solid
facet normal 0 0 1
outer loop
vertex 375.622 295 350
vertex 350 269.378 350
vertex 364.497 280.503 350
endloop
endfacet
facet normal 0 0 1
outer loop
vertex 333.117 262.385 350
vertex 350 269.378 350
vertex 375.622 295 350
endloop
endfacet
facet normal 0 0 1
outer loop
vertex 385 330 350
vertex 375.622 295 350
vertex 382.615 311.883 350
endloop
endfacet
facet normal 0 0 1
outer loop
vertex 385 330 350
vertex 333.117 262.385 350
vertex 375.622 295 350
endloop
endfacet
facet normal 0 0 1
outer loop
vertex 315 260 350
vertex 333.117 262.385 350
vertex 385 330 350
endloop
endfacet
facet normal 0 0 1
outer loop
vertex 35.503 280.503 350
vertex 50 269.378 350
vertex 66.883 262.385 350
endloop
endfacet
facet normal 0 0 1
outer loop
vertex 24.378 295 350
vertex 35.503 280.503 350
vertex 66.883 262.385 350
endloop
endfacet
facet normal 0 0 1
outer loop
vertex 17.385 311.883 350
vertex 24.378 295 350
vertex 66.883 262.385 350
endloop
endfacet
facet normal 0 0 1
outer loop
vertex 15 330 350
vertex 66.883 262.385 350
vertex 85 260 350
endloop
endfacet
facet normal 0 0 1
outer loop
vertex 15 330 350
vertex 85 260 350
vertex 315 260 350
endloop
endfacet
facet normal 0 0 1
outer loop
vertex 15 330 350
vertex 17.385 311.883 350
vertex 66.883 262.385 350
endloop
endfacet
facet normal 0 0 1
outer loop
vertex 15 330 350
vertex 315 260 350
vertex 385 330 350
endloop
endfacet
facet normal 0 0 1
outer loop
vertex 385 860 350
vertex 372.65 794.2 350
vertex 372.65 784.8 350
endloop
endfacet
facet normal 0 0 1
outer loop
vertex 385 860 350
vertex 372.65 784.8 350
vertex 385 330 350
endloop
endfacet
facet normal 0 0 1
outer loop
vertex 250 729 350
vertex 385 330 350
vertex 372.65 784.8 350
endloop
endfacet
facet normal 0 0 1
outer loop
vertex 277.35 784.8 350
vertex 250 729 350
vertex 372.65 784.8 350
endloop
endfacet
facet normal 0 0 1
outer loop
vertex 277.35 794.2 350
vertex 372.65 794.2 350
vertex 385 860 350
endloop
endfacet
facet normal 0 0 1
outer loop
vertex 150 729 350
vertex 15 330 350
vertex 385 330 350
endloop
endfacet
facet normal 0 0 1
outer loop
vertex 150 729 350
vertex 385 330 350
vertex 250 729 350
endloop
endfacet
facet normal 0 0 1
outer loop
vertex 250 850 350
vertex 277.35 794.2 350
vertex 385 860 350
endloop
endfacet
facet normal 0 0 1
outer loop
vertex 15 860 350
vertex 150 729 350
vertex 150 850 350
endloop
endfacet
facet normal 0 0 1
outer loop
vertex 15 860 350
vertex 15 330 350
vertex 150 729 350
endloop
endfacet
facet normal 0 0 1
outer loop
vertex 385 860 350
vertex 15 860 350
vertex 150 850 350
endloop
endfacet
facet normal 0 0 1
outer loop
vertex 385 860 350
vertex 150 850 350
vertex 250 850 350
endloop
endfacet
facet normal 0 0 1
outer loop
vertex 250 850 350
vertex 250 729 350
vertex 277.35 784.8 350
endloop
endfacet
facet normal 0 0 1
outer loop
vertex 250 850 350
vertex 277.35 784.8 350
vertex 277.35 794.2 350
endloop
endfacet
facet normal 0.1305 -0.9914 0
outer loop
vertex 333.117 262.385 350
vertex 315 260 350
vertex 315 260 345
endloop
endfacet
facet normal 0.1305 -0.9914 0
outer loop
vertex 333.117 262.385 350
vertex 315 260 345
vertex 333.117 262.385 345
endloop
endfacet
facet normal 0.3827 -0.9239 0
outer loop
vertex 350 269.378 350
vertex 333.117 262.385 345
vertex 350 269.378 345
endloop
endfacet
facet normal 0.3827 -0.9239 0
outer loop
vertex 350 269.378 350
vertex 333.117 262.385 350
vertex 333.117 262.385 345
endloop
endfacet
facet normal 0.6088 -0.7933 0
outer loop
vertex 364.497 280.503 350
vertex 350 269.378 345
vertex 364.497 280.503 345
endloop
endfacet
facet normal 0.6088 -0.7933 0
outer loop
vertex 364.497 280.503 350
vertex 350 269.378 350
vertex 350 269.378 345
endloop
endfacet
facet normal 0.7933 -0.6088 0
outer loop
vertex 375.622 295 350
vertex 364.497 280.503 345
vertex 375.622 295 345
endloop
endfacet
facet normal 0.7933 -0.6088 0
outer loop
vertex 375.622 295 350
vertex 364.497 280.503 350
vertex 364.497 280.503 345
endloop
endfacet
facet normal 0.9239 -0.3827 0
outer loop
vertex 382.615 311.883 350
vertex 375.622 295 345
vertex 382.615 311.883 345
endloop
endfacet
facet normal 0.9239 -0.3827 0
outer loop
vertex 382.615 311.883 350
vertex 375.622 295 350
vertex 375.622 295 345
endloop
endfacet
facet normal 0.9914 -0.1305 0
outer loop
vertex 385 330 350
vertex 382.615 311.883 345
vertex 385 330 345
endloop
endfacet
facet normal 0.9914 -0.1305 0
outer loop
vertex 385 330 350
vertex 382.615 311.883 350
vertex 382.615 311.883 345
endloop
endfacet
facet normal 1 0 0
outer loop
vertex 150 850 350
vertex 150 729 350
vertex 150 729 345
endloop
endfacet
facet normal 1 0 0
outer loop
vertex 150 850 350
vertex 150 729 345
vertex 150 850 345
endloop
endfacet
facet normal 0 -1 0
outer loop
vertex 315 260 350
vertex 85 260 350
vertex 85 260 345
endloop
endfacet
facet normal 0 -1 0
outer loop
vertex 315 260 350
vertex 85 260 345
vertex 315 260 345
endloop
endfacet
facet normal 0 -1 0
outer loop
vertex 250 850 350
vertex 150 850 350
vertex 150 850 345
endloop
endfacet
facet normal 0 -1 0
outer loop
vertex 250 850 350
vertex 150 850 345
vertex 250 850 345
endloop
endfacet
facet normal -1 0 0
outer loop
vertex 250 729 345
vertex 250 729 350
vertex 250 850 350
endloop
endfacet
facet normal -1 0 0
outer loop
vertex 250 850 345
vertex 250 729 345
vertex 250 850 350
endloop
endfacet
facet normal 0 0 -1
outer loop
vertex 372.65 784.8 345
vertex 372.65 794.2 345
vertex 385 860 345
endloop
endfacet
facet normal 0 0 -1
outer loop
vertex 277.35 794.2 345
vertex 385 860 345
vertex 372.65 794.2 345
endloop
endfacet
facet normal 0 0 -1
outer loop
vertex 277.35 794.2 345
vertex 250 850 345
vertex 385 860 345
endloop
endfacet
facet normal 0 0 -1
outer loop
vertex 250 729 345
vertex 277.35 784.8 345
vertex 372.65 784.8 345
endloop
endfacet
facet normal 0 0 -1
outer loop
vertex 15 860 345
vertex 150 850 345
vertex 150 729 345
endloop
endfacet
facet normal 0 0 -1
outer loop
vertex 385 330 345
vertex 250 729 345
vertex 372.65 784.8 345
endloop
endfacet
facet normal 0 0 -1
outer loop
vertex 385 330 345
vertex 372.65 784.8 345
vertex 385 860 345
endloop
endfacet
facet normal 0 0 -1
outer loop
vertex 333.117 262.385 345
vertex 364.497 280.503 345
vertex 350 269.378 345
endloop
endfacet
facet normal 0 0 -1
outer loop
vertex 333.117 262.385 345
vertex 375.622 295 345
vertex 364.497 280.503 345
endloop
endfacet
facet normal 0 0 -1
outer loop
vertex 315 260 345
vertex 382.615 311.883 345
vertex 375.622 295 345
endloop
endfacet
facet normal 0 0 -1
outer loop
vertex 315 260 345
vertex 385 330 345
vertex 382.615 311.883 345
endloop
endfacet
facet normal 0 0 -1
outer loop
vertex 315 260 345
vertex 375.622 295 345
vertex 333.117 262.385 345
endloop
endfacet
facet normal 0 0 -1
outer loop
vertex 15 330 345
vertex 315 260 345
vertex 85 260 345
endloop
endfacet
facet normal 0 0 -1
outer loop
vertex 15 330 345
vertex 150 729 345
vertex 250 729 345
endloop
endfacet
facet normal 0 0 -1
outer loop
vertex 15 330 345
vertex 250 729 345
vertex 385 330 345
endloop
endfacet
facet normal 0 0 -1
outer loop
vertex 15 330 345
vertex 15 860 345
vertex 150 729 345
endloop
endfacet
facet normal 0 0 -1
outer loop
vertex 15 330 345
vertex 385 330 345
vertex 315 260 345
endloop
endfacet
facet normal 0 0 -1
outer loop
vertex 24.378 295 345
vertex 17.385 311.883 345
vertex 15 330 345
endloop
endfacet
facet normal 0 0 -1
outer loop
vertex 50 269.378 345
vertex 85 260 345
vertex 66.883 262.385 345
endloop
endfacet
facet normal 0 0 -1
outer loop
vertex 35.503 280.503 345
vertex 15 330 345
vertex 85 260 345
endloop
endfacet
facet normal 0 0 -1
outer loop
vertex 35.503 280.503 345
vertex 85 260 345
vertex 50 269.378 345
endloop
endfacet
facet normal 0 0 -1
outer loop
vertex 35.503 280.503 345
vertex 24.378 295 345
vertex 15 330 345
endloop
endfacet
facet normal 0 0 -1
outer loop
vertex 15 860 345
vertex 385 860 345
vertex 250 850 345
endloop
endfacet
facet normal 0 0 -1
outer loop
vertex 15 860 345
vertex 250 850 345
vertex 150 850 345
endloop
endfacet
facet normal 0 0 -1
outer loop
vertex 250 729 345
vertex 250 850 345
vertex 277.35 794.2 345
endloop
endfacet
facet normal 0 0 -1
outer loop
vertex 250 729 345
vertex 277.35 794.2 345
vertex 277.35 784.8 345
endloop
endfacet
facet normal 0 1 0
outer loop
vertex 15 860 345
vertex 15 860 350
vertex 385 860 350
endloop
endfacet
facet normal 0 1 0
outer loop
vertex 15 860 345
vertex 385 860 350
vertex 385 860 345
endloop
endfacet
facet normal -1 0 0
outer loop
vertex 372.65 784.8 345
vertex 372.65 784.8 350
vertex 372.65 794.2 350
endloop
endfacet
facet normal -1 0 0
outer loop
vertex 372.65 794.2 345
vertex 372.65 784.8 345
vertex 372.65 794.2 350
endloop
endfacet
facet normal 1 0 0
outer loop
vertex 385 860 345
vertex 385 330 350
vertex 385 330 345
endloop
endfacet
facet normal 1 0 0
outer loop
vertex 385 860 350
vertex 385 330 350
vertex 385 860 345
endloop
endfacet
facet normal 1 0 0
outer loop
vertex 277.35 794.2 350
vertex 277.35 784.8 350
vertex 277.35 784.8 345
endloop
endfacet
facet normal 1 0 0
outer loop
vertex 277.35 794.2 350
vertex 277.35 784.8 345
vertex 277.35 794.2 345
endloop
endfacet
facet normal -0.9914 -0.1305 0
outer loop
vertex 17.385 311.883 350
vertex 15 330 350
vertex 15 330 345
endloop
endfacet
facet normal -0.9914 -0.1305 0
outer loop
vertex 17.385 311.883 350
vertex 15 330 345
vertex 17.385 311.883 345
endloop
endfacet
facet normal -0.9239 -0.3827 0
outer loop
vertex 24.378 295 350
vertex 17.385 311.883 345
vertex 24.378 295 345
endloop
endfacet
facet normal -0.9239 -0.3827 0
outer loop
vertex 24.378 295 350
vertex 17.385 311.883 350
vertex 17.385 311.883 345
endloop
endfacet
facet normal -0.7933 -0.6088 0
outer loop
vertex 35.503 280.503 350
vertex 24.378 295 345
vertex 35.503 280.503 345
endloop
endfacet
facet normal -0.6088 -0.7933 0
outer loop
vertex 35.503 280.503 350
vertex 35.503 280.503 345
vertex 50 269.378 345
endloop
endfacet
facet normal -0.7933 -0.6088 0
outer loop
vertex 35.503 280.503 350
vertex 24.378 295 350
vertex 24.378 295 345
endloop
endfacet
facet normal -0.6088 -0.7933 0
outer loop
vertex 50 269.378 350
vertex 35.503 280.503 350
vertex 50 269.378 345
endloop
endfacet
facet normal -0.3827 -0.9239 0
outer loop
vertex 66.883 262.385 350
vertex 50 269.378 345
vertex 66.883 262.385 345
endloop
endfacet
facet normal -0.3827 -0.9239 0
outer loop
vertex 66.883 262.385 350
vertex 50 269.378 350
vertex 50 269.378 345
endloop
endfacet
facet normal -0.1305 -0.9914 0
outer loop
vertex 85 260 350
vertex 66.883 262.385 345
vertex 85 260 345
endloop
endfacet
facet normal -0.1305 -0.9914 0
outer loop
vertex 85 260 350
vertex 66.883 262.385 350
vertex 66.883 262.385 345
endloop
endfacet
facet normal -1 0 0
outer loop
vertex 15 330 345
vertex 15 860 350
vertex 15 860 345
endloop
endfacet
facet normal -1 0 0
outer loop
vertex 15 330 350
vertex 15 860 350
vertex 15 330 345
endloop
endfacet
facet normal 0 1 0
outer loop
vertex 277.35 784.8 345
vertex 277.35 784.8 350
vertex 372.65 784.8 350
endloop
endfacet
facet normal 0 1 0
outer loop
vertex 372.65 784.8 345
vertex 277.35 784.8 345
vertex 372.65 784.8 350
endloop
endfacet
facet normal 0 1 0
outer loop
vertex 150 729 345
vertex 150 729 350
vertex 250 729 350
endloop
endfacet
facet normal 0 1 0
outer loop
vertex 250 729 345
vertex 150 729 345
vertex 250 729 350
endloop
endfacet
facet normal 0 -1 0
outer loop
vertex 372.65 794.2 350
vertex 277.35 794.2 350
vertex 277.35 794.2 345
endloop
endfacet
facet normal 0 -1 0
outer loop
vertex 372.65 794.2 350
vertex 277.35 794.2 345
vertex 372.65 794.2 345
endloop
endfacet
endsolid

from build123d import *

# Parameters (mm, degrees)
BOSS_EXTRUDE1_DEPTH = 400
SKETCH2_W           = 100
SKETCH2_H           = 121
SKETCH2_W_2         = 95.3
SKETCH2_H_2         = 9.4
CUT_EXTRUDE1_DEPTH  = 268
CUT_EXTRUDE2_DEPTH  = 574
CUT_EXTRUDE3_DEPTH  = 574


with BuildPart() as part:
    # Sketch1 → Boss-Extrude1 (new body)
    with BuildSketch(Plane(origin=(0, 0, 0), x_dir=(0, 0, -1), z_dir=(1, 0, 0))):
        with BuildLine():
            Line((0, 0), (-350, 0))
            Line((-350, 0), (-350, 860))
            ThreePointArc((-350, 860), (-338.284271247, 888.284271247), (-310, 900))
            Line((-310, 900), (-158.48888922, 900))
            Line((-158.48888922, 900), (-158.48888922, 1060.696902422))
            ThreePointArc((-158.48888922, 1060.696902422), (-46.288149621, 1012.851918963), (0, 900))
            Line((0, 900), (0, 0))
        make_face()
    extrude(amount=BOSS_EXTRUDE1_DEPTH)

    # Sketch2 → Cut-Extrude1 (cut)
    with BuildSketch(Plane.XY.offset(350)):
        with Locations((200, 789.5)):
            Rectangle(SKETCH2_W, SKETCH2_H)
        with Locations((325, 789.5)):
            Rectangle(SKETCH2_W_2, SKETCH2_H_2)
    extrude(amount=-CUT_EXTRUDE1_DEPTH, mode=Mode.SUBTRACT)

    # Sketch3 → Cut-Extrude2 (cut)
    with BuildSketch(Plane.ZY):
        Polygon((350, 860), (345, 860), (345, -140.268205657), (-654.048621222, 0), (-155.382910131, 1729.32315512), (878.315397885, 1431.24705506), align=None)
    extrude(amount=-CUT_EXTRUDE2_DEPTH, mode=Mode.SUBTRACT)

    # Sketch4 → Cut-Extrude3 (cut)
    with BuildSketch(Plane.XY.offset(350)):
        with BuildLine():
            Line((15, 917.971493868), (15, 330))
            ThreePointArc((15, 330), (35.502525317, 280.502525317), (85, 260))
            Line((85, 260), (315, 260))
            ThreePointArc((315, 260), (364.497474683, 280.502525317), (385, 330))
            Line((385, 330), (385, 917.971493868))
            Line((385, 917.971493868), (580.540592228, 679.226510724))
            Line((580.540592228, 679.226510724), (899.548672457, -163.886240254))
            Line((899.548672457, -163.886240254), (163.483674451, -163.886240254))
            Line((163.483674451, -163.886240254), (110.907603164, -163.886240254))
            Line((110.907603164, -163.886240254), (-601.64880395, 753.812426605))
            Line((-601.64880395, 753.812426605), (15, 917.971493868))
        make_face()
    extrude(amount=-CUT_EXTRUDE3_DEPTH, mode=Mode.SUBTRACT)


solid = part.part
